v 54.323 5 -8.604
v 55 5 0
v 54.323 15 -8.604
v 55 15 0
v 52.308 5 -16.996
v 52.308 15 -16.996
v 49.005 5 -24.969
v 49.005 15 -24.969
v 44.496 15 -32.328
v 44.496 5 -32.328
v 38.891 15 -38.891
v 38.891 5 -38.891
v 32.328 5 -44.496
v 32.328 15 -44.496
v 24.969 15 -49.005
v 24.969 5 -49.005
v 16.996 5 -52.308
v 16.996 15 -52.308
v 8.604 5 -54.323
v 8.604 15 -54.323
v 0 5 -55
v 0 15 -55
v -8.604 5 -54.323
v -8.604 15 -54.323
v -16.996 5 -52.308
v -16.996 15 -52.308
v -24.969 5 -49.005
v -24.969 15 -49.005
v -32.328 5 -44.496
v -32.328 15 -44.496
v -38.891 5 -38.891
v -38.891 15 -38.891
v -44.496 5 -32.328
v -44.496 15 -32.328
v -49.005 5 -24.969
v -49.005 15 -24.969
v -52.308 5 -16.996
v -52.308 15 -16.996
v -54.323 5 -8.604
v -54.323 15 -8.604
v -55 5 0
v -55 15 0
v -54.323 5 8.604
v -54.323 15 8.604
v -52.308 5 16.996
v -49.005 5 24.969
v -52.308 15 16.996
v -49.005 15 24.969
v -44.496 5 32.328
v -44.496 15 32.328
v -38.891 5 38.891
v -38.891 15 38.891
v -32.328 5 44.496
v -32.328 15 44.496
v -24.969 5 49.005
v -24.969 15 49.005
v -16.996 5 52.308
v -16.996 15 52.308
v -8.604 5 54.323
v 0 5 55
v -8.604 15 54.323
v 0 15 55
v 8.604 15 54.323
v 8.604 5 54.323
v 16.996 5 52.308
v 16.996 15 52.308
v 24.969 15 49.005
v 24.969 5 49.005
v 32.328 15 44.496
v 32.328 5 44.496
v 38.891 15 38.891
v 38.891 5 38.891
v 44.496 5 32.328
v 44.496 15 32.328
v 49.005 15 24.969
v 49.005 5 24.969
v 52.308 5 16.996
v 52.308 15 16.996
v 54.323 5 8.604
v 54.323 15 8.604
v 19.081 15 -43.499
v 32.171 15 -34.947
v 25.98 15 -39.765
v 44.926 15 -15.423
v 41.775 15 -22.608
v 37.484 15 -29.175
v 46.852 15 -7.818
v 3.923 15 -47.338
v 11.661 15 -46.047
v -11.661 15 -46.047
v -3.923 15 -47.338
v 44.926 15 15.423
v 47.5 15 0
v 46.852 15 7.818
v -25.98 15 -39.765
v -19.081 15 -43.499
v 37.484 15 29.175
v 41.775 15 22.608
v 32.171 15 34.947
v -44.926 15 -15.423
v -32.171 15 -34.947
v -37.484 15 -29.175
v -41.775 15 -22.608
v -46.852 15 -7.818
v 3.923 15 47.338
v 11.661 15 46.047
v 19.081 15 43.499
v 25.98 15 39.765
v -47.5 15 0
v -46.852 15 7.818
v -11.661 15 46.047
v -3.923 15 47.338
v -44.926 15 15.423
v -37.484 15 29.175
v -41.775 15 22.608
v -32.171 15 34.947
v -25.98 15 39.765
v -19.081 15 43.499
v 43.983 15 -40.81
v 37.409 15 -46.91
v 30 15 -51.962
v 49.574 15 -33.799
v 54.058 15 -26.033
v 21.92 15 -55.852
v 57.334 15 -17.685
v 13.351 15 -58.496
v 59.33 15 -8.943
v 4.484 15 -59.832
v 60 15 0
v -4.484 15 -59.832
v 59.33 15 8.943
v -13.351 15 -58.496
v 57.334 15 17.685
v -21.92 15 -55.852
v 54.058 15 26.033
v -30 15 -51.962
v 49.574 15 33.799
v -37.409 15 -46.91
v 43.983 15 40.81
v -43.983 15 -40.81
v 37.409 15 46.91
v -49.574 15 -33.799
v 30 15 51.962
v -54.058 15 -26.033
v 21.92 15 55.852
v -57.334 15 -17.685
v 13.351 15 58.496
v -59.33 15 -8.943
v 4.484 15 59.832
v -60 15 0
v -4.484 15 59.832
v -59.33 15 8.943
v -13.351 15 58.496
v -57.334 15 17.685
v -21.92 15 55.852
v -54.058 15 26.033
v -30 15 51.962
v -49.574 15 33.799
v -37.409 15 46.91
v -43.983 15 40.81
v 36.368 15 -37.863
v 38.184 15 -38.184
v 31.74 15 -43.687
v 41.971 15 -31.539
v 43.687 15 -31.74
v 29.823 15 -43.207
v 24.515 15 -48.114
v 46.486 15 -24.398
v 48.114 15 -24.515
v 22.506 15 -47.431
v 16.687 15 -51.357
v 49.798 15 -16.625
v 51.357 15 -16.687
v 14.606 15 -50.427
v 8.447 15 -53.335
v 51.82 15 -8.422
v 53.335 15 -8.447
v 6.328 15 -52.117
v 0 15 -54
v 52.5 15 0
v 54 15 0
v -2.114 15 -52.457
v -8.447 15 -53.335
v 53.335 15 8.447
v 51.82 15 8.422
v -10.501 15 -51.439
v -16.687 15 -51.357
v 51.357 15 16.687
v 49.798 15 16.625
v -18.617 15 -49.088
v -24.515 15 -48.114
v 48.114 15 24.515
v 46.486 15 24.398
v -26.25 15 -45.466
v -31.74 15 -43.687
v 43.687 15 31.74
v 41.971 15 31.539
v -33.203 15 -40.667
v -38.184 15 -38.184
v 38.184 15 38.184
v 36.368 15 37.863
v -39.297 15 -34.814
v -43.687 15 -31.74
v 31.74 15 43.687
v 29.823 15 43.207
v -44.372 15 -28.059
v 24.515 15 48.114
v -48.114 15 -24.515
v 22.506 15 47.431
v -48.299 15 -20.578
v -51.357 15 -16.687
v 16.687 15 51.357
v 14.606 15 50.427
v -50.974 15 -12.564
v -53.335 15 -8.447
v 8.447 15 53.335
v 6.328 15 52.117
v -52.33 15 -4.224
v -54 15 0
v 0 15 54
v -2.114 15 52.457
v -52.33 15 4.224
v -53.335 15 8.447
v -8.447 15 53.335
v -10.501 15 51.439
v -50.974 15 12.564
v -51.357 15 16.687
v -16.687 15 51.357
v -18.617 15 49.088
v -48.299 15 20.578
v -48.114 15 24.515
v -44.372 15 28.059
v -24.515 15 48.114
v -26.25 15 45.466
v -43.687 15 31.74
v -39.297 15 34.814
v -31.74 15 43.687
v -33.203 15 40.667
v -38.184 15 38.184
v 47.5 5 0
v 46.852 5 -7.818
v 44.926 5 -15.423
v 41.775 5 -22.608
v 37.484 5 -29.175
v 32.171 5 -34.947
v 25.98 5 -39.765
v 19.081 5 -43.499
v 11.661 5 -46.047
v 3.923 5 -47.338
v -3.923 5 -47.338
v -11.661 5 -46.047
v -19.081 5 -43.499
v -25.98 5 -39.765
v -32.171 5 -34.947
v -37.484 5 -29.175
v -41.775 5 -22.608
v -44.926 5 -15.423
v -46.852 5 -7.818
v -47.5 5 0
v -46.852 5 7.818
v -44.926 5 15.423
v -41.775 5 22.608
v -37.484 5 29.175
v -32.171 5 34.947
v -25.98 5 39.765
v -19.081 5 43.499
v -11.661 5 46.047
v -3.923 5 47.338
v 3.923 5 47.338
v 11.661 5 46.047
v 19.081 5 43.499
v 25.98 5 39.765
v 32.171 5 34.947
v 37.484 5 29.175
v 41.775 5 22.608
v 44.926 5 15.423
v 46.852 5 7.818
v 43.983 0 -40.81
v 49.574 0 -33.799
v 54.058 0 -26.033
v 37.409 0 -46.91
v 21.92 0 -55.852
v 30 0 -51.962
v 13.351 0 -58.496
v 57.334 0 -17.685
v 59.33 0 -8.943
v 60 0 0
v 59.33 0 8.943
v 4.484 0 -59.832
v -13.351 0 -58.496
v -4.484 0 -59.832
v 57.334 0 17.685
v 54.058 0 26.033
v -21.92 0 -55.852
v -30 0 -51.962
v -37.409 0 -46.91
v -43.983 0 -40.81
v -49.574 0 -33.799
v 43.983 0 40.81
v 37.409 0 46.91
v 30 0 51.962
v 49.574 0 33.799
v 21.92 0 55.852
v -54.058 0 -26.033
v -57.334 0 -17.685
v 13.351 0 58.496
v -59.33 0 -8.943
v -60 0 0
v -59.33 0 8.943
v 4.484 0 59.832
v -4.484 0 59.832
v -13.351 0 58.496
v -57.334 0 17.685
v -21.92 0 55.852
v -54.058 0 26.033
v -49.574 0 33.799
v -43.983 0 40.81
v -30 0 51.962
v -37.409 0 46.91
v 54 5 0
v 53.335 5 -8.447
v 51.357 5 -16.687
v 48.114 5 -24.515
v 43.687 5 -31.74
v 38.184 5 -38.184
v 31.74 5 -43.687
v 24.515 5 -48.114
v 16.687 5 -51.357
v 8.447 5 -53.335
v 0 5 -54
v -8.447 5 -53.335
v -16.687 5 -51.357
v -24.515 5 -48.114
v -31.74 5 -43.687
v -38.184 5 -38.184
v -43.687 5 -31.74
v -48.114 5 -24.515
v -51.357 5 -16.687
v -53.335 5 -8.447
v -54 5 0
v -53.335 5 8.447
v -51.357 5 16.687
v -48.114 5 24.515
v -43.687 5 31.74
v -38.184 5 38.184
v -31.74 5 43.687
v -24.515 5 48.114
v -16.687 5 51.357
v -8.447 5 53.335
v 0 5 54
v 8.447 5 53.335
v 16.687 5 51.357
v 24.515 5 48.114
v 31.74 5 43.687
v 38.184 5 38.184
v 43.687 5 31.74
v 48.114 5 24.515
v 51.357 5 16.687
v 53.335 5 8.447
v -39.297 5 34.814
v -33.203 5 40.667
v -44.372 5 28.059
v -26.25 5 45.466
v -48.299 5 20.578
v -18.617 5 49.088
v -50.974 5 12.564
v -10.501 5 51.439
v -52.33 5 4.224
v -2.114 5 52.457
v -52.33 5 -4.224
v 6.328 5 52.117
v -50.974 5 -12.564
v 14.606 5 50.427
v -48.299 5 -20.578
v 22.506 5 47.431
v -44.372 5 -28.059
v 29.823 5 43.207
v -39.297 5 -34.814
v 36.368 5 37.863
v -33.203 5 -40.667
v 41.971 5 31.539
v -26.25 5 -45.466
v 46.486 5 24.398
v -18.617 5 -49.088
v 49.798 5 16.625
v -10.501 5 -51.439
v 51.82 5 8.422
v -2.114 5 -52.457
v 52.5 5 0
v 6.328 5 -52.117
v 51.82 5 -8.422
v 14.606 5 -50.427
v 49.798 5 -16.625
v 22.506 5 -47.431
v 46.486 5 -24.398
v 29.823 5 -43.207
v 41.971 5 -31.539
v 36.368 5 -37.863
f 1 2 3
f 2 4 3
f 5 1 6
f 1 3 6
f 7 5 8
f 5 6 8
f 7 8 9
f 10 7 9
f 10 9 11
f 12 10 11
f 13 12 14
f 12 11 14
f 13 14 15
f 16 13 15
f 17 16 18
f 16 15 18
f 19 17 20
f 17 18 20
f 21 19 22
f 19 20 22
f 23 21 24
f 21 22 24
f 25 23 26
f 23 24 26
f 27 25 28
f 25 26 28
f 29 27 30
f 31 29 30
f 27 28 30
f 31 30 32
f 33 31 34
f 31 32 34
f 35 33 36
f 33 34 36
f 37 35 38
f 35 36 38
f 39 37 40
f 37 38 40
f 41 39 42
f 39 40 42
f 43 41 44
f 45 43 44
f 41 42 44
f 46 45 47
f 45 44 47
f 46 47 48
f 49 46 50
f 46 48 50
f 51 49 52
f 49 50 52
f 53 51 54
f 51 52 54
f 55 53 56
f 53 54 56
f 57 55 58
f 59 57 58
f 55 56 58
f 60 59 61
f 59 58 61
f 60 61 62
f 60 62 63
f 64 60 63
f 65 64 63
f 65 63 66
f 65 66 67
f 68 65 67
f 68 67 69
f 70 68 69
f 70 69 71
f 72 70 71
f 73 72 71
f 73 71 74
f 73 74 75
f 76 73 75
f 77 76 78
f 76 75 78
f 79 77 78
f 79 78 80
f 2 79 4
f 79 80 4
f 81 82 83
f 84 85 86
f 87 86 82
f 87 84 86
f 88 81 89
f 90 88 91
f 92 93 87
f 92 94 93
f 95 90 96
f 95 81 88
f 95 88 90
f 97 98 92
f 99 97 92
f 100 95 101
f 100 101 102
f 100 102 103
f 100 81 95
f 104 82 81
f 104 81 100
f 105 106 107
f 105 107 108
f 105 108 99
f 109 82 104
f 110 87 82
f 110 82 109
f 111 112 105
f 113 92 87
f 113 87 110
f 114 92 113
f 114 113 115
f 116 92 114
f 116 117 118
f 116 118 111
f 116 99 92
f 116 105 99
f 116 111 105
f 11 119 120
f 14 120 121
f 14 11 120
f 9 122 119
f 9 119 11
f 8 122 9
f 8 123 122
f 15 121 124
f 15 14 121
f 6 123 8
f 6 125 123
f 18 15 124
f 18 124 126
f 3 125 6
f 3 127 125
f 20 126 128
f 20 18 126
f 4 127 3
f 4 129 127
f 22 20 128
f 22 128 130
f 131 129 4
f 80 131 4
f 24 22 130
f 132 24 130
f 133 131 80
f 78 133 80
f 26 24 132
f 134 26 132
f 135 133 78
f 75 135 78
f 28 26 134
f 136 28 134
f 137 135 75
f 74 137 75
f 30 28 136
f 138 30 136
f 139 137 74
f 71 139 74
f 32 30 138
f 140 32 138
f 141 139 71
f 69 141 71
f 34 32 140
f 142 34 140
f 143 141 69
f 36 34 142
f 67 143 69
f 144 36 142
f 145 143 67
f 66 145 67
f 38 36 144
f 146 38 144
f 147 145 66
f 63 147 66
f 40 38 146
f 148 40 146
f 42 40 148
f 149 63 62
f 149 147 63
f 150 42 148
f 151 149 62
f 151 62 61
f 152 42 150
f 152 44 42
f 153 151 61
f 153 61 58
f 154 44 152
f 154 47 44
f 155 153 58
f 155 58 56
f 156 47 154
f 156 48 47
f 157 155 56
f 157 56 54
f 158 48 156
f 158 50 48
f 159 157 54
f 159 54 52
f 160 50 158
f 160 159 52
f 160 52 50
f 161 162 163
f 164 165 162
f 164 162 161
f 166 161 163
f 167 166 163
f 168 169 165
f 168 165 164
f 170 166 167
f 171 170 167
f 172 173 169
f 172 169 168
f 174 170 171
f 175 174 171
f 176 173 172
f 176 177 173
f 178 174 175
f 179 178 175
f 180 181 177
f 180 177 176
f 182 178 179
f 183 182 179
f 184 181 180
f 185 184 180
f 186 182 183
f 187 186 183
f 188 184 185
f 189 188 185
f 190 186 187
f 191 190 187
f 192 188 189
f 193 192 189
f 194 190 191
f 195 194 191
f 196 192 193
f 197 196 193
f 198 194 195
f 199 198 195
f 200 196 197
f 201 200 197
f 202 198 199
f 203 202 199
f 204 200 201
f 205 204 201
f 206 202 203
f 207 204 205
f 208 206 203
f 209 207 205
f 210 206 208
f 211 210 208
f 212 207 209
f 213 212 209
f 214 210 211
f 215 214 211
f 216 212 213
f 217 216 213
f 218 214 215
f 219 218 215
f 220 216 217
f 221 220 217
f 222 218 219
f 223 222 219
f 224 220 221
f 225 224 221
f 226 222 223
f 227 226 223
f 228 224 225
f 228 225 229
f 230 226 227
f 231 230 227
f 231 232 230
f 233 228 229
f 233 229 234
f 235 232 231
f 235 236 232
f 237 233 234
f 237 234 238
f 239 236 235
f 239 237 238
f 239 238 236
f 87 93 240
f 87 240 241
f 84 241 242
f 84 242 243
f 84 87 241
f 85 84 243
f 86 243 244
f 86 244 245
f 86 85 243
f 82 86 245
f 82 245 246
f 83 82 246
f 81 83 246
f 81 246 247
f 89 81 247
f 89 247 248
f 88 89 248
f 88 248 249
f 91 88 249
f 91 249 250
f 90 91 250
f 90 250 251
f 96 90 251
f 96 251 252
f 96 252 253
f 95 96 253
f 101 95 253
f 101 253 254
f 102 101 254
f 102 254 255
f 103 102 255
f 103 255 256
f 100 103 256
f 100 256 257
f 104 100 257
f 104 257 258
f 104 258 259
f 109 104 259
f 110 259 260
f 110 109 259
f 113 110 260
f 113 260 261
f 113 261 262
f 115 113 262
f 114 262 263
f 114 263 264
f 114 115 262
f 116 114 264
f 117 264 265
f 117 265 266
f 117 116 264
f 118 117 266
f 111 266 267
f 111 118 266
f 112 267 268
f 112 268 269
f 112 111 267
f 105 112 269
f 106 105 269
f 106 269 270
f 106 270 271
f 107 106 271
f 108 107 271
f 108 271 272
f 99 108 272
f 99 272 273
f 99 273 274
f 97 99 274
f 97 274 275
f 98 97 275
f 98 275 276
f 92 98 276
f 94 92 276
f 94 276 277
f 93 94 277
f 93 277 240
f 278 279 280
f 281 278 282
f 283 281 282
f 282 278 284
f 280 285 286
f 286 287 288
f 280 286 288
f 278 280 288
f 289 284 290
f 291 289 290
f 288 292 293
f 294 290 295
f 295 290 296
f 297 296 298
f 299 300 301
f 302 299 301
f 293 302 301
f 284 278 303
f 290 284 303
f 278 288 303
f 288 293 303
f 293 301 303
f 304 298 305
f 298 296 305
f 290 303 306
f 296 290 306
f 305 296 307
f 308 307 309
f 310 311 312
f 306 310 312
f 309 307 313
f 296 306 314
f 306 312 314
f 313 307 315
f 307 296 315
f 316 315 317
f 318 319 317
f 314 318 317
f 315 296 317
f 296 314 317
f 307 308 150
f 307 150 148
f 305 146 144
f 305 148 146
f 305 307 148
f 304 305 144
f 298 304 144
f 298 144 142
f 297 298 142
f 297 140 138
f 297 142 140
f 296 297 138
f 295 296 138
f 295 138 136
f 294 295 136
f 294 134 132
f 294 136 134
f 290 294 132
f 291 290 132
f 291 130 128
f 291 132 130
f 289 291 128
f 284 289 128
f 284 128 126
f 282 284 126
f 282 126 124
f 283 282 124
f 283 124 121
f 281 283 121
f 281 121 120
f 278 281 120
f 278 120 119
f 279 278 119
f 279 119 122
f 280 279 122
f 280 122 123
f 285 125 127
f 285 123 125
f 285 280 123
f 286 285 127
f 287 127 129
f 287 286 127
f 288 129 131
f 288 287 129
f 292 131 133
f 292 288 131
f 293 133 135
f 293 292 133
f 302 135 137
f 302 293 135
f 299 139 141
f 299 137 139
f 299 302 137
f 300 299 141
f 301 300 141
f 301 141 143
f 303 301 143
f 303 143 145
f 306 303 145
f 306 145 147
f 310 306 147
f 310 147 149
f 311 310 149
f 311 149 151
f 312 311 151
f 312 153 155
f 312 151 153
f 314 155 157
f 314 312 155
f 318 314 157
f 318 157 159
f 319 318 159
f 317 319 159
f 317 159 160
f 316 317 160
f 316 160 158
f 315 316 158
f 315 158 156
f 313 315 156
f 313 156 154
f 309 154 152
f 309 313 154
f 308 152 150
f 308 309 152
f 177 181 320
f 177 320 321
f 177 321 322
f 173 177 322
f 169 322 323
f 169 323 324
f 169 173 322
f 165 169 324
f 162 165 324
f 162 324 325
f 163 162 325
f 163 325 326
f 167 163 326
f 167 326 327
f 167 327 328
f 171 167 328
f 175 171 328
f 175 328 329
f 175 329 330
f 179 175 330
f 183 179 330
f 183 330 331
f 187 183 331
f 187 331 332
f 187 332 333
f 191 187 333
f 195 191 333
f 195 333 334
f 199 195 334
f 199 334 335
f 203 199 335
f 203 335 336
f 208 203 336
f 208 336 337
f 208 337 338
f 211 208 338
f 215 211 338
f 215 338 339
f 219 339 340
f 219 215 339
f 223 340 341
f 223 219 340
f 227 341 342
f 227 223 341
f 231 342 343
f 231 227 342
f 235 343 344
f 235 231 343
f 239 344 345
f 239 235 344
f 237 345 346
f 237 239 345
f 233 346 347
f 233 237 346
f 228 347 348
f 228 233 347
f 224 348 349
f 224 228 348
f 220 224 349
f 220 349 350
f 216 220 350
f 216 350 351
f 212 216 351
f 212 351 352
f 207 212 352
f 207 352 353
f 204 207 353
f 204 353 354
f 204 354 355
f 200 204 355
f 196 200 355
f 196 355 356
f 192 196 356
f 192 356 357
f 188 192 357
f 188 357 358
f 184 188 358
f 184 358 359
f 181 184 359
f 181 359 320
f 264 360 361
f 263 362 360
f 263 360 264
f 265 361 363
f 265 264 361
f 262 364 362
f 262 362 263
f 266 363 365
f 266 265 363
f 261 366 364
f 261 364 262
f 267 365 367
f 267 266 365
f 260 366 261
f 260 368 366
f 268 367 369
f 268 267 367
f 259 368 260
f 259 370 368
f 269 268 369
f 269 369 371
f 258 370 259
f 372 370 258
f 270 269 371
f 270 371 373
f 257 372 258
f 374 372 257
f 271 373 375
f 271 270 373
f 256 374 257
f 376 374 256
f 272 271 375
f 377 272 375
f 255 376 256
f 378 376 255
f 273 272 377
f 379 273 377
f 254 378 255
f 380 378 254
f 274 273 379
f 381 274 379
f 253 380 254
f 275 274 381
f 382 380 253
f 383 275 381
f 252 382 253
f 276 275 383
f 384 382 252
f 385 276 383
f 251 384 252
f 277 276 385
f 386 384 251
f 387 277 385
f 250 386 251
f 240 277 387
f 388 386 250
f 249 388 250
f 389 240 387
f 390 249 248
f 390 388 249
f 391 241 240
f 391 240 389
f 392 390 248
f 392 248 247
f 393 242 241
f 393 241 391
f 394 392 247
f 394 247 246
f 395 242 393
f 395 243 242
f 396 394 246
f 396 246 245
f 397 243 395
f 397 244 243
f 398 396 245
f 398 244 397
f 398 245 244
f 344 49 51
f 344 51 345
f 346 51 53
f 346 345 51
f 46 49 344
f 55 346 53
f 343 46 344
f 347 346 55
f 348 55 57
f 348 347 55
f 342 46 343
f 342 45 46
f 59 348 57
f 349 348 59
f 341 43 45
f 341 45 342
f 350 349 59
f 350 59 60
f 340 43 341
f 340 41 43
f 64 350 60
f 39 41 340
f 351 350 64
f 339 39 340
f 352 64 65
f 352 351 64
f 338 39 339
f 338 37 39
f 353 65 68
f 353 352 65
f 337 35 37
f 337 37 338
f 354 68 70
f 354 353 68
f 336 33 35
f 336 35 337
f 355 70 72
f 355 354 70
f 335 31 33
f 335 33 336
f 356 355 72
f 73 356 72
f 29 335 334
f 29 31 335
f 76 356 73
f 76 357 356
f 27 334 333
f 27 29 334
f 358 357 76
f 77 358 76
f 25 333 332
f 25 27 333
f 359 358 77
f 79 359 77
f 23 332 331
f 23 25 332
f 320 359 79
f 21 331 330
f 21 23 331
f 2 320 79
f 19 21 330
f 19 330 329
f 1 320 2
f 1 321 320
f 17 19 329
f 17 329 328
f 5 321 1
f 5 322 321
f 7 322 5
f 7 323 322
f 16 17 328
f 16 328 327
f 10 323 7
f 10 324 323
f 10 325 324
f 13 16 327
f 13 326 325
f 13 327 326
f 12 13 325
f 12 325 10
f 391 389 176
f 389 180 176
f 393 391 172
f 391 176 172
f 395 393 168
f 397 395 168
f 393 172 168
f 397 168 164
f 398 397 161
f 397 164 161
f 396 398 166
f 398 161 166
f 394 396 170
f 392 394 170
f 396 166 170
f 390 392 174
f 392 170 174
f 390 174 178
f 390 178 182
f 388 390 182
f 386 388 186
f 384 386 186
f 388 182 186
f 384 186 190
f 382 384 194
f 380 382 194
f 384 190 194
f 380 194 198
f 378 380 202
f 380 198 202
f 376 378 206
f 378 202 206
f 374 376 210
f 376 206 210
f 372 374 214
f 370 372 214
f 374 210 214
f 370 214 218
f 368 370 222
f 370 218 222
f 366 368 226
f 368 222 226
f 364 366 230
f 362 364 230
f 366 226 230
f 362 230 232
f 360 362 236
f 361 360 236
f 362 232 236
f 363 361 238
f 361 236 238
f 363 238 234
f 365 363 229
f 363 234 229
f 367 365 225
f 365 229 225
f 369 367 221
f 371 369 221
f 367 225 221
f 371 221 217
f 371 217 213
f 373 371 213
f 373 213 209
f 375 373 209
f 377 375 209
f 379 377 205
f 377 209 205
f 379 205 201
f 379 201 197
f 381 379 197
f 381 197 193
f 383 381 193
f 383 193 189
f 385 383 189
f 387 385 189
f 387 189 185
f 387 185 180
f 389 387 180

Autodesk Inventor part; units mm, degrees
ref_plane "YZ Plane" through (0, 0, 0) normal (1, 0, 0) x (0, 1, 0)
ref_plane "XZ Plane" through (0, 0, 0) normal (0, 1, 0) x (-1, 0, 0)
ref_plane "XY Plane" through (0, 0, 0) normal (0, 0, 1) x (1, 0, 0)
sketch "Sketch1" plane through (0, 0, 0) normal (0, 1, 0) x (-1, 0, 0)
  circle A0 centre (0, 0) radius 60
  dimension "d0" = 120
extrude "Extrusion1" add sketch "Sketch1" along normal blind 15
sketch "Sketch2" plane through (0, 15, 0) normal (0, 1, 0) x (1, 0, 0)
  circle A0 centre (0, 0) radius 52.5
  circle A1 centre (0, 0) radius 47.5
  dimension "d3" = 105
  dimension "d4" = 95
extrude "Extrusion2" cut sketch "Sketch2" against normal blind 10
sketch "Sketch3" plane through (0, 15, 0) normal (0, 1, 0) x (1, 0, 0)
  circle A0 centre (0, 0) radius 55
  circle A1 centre (0, 0) radius 54
  dimension "d7" = 110
  dimension "d8" = 108
extrude "Extrusion3" cut sketch "Sketch3" against normal blind 10
properties part number "pathBase" material "Stainless Steel"
